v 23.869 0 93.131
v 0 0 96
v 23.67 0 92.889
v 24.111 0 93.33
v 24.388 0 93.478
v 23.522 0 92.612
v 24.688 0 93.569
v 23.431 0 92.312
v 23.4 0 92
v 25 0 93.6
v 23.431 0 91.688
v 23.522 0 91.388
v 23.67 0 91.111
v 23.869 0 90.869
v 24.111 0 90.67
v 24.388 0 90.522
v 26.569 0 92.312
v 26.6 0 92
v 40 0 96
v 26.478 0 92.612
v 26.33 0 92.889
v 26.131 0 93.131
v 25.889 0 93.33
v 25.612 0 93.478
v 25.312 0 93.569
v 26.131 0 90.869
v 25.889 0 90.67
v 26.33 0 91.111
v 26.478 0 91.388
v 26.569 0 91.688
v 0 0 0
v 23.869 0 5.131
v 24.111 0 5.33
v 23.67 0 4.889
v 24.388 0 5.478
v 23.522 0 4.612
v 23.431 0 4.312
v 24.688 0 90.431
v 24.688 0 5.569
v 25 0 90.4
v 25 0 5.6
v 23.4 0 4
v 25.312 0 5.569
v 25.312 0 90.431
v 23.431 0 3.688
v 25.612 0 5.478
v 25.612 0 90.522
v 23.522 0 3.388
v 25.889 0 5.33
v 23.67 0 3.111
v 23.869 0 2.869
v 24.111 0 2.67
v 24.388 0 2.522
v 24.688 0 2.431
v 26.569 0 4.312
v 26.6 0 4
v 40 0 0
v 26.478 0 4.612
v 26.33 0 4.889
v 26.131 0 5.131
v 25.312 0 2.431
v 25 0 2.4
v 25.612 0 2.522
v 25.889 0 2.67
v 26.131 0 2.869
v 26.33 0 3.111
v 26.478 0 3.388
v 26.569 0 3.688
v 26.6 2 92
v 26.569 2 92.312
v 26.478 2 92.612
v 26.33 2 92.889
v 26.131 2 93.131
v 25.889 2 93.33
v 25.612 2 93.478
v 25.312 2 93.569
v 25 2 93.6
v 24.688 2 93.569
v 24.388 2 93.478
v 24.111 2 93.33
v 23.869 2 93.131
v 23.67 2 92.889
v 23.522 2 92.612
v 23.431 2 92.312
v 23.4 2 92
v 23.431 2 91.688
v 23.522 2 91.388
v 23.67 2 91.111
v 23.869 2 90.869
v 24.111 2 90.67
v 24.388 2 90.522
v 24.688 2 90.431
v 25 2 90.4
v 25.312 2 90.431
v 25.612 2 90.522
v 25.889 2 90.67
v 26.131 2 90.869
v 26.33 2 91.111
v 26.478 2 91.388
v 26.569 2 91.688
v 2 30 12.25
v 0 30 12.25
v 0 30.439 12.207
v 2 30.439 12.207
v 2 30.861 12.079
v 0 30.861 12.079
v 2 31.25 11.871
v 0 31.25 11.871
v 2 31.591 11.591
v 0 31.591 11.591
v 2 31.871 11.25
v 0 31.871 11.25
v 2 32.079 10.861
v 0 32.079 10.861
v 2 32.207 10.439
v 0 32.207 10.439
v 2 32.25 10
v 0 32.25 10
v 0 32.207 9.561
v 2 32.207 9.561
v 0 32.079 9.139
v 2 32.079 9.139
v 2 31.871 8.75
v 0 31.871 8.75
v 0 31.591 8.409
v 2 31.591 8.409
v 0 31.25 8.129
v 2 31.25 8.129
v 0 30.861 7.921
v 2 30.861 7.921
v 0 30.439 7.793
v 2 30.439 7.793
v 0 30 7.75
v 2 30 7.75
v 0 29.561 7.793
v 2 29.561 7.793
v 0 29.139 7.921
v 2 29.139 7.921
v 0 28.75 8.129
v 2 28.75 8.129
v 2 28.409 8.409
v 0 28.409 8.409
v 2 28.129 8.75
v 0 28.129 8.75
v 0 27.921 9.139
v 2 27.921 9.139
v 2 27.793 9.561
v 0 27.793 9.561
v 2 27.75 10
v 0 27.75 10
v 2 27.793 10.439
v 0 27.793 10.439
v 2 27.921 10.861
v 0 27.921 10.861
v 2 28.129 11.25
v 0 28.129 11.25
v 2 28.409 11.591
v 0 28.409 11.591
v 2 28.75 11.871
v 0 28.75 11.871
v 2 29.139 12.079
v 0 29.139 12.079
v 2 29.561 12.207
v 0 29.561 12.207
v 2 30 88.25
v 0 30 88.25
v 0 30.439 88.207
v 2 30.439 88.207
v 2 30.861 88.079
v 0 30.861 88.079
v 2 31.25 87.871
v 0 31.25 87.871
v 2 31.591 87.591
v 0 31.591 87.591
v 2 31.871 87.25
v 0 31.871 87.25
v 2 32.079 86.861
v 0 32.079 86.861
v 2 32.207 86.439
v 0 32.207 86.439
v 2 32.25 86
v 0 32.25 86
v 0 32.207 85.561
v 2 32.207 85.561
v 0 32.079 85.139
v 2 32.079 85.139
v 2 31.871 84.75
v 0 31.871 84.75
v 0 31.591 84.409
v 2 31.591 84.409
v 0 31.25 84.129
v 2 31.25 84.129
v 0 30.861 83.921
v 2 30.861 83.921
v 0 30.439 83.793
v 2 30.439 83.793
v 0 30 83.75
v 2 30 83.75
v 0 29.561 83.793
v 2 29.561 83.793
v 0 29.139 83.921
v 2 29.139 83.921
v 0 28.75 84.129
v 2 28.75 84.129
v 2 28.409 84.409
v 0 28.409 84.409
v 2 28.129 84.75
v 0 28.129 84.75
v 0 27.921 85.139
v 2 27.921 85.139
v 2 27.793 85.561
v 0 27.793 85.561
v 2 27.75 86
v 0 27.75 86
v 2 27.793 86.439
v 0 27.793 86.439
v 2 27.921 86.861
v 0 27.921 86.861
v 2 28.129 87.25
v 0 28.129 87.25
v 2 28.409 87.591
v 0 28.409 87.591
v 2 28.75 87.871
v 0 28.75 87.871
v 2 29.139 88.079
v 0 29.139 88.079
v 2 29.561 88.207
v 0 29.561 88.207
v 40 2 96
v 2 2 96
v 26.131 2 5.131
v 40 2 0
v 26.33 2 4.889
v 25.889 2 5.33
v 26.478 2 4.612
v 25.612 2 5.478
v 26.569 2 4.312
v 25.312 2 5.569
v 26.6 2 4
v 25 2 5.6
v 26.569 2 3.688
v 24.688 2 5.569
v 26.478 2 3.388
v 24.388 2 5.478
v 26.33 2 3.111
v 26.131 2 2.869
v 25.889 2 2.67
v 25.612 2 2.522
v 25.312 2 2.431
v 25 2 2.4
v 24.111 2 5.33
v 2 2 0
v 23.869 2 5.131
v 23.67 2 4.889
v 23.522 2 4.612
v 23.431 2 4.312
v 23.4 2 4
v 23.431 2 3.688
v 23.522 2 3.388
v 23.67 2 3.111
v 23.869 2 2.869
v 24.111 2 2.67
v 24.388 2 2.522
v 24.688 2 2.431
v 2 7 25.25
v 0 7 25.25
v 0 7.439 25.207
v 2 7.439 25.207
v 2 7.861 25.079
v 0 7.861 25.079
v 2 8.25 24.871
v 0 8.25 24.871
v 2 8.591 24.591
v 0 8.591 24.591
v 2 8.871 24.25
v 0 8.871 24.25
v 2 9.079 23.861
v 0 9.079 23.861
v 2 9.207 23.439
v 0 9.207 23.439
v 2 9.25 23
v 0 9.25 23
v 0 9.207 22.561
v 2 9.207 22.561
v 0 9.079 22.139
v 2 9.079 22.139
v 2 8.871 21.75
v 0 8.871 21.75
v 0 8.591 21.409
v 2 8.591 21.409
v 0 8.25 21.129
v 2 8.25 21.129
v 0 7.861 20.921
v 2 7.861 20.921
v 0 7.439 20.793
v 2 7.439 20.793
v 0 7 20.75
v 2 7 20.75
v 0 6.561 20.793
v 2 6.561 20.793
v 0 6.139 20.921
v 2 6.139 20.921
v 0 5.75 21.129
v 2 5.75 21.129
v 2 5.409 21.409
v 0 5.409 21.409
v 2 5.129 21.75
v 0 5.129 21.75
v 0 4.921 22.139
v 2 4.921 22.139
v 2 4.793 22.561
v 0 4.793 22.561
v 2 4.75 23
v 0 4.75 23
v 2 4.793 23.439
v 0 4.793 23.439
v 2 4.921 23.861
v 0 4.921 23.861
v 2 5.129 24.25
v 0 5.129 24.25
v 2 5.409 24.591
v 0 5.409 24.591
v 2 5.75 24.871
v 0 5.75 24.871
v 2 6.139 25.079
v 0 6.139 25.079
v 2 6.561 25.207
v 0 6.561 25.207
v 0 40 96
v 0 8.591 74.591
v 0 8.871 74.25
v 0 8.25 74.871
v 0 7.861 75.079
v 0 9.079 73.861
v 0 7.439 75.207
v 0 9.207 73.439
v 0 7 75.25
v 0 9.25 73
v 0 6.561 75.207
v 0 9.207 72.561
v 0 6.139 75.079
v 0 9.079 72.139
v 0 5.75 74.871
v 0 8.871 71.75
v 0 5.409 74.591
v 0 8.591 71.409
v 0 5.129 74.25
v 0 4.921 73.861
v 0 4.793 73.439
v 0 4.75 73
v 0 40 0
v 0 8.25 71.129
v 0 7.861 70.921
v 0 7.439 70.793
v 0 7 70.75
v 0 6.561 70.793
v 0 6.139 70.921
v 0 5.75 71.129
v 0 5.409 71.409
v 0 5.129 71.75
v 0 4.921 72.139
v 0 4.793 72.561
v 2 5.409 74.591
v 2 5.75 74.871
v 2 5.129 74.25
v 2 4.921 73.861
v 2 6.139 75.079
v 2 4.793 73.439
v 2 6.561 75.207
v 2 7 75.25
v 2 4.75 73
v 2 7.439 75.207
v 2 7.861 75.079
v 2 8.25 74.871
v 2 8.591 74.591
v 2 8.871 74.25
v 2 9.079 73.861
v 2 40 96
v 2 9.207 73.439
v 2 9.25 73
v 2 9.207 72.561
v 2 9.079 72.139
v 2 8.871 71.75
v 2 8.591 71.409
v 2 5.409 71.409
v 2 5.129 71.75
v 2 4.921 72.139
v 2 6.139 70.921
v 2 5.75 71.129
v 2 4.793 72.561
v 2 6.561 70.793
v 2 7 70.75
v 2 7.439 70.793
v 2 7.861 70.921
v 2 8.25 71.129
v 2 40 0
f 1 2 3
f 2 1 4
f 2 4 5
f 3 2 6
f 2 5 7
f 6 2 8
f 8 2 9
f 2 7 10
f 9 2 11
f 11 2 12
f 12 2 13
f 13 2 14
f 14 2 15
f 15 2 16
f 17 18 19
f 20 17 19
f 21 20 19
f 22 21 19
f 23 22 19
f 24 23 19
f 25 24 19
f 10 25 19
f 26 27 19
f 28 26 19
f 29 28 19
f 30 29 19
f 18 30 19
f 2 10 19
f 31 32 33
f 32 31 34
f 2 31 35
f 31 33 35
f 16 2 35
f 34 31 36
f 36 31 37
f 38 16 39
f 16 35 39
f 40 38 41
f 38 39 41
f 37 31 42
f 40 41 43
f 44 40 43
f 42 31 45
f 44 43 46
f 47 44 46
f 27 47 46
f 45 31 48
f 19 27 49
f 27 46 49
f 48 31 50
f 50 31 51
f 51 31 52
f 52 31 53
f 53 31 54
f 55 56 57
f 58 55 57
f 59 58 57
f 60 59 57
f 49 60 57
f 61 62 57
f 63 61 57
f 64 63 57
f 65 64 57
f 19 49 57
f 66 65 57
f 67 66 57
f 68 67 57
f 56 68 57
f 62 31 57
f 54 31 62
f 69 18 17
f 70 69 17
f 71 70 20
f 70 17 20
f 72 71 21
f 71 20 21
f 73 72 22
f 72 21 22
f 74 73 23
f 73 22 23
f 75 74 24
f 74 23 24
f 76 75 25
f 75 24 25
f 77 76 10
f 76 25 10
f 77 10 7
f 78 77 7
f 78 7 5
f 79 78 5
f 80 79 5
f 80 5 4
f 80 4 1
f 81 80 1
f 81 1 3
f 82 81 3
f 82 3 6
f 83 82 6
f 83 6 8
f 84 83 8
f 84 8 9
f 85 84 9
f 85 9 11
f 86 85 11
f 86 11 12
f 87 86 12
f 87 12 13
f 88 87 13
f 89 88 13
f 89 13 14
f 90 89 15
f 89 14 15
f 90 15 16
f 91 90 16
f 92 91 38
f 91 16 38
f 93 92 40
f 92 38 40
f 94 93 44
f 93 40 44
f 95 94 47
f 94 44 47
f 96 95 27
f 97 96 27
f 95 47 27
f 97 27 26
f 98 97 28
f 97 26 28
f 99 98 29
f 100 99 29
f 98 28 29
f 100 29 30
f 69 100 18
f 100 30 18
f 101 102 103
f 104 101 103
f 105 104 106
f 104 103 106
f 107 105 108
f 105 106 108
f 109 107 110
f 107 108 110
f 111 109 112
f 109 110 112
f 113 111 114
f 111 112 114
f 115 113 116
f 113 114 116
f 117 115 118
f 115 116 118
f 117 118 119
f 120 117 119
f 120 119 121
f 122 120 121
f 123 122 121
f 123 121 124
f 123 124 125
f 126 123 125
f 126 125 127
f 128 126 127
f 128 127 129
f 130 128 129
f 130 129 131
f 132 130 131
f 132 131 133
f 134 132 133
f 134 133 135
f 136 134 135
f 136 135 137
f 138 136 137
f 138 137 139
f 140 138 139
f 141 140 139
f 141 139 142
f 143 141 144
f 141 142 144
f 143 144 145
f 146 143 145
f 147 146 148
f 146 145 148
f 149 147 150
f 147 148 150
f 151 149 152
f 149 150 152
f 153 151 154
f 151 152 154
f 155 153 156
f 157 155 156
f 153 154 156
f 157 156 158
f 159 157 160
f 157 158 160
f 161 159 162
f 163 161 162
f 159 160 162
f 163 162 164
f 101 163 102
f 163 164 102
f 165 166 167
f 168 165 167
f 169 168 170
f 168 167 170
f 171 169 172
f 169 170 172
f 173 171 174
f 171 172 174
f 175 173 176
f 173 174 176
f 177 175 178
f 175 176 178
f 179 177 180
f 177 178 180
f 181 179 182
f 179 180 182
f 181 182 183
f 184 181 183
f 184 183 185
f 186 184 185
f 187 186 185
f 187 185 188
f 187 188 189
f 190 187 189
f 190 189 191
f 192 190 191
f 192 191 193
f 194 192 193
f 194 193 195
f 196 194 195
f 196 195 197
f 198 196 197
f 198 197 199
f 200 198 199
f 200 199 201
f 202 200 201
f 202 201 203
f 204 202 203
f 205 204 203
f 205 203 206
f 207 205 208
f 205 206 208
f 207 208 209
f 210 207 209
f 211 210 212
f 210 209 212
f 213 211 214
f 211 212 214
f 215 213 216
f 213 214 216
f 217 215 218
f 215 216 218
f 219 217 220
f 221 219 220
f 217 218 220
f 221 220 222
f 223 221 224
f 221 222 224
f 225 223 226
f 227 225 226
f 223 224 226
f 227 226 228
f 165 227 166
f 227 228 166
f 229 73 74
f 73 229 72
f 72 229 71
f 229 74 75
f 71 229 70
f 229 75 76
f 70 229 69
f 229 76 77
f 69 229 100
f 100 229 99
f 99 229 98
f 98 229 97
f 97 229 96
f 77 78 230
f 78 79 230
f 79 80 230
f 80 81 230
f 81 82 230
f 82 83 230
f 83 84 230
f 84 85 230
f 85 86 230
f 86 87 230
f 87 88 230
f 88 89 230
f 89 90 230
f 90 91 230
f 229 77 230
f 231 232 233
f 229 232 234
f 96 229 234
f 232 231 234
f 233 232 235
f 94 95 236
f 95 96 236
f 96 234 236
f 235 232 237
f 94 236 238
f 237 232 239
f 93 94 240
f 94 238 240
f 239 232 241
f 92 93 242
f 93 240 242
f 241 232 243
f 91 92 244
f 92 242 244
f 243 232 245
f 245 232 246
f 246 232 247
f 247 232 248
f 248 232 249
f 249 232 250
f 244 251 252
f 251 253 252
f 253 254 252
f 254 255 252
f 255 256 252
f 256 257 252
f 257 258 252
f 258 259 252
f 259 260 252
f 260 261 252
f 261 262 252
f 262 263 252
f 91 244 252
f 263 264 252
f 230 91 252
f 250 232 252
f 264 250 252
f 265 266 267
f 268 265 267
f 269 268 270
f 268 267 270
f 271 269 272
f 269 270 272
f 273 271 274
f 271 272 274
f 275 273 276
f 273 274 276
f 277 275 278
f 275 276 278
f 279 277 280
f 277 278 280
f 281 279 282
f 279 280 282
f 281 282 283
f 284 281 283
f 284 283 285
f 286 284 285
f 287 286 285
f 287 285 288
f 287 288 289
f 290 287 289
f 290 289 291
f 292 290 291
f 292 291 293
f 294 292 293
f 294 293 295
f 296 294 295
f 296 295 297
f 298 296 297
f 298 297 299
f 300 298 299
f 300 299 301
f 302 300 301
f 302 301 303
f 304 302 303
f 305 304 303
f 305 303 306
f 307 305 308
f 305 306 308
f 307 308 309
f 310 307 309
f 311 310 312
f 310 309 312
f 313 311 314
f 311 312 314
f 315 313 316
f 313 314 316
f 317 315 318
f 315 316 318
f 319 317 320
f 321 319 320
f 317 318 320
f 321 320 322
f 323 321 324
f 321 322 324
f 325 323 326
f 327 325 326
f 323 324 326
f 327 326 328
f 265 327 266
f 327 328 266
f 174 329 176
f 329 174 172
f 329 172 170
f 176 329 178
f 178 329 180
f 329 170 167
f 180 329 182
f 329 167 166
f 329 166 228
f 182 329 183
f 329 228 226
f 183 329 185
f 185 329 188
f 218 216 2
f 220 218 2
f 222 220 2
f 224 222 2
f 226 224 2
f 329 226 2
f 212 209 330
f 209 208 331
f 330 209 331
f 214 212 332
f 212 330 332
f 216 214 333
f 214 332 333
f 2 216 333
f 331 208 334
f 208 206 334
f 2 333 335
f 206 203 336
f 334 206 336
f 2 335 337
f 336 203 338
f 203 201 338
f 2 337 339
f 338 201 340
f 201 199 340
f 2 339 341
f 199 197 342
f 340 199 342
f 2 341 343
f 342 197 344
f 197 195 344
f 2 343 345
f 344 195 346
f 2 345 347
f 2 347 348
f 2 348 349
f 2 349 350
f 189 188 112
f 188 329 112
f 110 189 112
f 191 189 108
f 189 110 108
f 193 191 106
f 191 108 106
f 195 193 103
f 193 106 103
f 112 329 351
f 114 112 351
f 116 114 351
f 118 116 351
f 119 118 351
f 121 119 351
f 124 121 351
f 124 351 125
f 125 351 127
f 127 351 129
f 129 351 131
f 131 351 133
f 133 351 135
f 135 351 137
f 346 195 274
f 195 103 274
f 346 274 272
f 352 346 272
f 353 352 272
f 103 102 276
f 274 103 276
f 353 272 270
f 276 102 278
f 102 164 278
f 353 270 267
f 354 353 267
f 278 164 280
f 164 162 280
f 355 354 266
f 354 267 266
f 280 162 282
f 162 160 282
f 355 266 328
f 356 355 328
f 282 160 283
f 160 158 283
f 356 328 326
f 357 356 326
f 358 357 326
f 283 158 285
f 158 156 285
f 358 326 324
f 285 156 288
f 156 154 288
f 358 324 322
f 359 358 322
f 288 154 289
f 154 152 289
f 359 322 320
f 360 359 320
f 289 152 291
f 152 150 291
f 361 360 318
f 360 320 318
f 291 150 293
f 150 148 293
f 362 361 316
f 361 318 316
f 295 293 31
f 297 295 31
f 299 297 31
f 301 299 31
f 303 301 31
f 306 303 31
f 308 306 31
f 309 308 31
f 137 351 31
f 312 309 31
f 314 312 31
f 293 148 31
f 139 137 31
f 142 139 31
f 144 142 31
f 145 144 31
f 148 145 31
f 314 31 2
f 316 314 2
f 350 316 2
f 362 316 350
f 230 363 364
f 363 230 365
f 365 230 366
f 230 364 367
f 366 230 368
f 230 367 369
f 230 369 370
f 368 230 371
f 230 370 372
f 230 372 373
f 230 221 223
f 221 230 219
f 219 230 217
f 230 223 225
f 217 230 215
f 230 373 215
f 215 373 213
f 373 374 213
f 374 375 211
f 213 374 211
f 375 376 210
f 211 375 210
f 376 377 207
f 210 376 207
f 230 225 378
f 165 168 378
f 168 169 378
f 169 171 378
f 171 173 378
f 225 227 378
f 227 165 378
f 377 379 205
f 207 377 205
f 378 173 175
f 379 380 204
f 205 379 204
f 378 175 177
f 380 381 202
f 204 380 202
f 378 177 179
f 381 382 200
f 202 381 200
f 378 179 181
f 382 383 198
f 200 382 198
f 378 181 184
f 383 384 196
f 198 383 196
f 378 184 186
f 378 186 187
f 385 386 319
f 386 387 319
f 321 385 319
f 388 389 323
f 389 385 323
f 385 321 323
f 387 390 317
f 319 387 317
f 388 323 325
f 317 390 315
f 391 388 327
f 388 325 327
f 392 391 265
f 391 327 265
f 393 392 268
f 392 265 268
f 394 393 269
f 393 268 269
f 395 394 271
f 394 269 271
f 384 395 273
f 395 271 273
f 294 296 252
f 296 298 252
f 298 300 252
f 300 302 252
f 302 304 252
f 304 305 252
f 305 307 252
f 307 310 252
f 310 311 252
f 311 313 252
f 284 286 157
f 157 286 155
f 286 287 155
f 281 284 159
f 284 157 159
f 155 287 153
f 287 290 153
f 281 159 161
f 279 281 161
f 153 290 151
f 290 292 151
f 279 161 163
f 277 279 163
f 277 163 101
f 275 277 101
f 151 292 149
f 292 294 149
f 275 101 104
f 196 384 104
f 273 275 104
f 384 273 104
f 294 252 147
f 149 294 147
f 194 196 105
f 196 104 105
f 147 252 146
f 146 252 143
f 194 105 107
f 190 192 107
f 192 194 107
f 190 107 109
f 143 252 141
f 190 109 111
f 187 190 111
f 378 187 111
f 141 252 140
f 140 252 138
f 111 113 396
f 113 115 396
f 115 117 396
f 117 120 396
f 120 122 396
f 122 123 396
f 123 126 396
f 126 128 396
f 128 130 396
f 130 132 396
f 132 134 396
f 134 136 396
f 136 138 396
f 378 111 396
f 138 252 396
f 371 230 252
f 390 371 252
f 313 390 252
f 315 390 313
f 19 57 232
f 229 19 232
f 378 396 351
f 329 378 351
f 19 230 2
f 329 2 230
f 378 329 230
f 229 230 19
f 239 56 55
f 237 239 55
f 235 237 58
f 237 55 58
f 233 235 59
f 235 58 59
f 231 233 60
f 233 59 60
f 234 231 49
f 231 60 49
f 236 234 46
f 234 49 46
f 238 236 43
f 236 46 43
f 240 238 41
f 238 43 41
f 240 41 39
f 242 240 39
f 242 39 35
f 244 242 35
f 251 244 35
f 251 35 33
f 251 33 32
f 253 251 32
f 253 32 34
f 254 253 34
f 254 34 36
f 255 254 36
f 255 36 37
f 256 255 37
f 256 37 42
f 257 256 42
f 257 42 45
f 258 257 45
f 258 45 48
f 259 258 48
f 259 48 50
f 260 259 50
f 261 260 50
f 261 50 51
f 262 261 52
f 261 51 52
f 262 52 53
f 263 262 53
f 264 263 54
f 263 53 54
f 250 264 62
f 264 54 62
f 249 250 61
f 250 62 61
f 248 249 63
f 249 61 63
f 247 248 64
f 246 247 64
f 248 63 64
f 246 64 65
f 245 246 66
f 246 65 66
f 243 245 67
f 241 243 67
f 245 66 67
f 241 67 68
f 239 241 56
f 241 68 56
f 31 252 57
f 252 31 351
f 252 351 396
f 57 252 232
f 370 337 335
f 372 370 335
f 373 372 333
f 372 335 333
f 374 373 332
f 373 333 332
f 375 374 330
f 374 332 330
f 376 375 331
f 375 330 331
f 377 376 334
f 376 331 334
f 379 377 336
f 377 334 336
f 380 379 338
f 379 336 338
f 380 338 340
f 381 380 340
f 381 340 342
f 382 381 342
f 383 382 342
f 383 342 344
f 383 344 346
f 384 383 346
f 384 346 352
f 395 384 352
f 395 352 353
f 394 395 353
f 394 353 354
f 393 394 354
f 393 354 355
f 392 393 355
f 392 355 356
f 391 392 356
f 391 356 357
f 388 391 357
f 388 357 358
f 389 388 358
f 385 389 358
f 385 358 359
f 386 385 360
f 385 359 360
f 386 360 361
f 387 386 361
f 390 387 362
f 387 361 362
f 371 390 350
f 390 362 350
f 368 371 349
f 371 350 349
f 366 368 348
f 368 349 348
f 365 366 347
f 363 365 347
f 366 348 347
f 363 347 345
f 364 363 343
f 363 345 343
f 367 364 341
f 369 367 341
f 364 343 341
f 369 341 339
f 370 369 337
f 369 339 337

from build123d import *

# Parameters (mm, degrees)
EXTRUDE_1_DEPTH     = 96
SKETCH_2_R          = 1.6
CUT_EXTRUDE_1_DEPTH = 41
SKETCH_3_R          = 2.25
CUT_EXTRUDE_2_DEPTH = 41


with BuildPart() as part:
    # Эскиз1 → Бобышка-Вытянуть1 (new body)
    with BuildSketch(Plane.XY):
        Polygon((0, 0), (40, 0), (40, 2), (2, 2), (2, 40), (0, 40), align=None)
    extrude(amount=EXTRUDE_1_DEPTH)

    # Эскиз2 → Вырез-Вытянуть1 (cut, through all)
    with BuildSketch(Plane.XZ):
        with Locations((25, 92)):
            Circle(SKETCH_2_R)
        with Locations((25, 4)):
            Circle(SKETCH_2_R)
    extrude(amount=-CUT_EXTRUDE_1_DEPTH, mode=Mode.SUBTRACT)

    # Эскиз3 → Вырез-Вытянуть2 (cut, through all)
    with BuildSketch(Plane.ZY):
        with Locations((10, 30)):
            Circle(SKETCH_3_R)
        with Locations((86, 30)):
            Circle(SKETCH_3_R)
        with Locations((73, 7)):
            Circle(SKETCH_3_R)
        with Locations((23, 7)):
            Circle(SKETCH_3_R)
    extrude(amount=-CUT_EXTRUDE_2_DEPTH, mode=Mode.SUBTRACT)


solid = part.part
